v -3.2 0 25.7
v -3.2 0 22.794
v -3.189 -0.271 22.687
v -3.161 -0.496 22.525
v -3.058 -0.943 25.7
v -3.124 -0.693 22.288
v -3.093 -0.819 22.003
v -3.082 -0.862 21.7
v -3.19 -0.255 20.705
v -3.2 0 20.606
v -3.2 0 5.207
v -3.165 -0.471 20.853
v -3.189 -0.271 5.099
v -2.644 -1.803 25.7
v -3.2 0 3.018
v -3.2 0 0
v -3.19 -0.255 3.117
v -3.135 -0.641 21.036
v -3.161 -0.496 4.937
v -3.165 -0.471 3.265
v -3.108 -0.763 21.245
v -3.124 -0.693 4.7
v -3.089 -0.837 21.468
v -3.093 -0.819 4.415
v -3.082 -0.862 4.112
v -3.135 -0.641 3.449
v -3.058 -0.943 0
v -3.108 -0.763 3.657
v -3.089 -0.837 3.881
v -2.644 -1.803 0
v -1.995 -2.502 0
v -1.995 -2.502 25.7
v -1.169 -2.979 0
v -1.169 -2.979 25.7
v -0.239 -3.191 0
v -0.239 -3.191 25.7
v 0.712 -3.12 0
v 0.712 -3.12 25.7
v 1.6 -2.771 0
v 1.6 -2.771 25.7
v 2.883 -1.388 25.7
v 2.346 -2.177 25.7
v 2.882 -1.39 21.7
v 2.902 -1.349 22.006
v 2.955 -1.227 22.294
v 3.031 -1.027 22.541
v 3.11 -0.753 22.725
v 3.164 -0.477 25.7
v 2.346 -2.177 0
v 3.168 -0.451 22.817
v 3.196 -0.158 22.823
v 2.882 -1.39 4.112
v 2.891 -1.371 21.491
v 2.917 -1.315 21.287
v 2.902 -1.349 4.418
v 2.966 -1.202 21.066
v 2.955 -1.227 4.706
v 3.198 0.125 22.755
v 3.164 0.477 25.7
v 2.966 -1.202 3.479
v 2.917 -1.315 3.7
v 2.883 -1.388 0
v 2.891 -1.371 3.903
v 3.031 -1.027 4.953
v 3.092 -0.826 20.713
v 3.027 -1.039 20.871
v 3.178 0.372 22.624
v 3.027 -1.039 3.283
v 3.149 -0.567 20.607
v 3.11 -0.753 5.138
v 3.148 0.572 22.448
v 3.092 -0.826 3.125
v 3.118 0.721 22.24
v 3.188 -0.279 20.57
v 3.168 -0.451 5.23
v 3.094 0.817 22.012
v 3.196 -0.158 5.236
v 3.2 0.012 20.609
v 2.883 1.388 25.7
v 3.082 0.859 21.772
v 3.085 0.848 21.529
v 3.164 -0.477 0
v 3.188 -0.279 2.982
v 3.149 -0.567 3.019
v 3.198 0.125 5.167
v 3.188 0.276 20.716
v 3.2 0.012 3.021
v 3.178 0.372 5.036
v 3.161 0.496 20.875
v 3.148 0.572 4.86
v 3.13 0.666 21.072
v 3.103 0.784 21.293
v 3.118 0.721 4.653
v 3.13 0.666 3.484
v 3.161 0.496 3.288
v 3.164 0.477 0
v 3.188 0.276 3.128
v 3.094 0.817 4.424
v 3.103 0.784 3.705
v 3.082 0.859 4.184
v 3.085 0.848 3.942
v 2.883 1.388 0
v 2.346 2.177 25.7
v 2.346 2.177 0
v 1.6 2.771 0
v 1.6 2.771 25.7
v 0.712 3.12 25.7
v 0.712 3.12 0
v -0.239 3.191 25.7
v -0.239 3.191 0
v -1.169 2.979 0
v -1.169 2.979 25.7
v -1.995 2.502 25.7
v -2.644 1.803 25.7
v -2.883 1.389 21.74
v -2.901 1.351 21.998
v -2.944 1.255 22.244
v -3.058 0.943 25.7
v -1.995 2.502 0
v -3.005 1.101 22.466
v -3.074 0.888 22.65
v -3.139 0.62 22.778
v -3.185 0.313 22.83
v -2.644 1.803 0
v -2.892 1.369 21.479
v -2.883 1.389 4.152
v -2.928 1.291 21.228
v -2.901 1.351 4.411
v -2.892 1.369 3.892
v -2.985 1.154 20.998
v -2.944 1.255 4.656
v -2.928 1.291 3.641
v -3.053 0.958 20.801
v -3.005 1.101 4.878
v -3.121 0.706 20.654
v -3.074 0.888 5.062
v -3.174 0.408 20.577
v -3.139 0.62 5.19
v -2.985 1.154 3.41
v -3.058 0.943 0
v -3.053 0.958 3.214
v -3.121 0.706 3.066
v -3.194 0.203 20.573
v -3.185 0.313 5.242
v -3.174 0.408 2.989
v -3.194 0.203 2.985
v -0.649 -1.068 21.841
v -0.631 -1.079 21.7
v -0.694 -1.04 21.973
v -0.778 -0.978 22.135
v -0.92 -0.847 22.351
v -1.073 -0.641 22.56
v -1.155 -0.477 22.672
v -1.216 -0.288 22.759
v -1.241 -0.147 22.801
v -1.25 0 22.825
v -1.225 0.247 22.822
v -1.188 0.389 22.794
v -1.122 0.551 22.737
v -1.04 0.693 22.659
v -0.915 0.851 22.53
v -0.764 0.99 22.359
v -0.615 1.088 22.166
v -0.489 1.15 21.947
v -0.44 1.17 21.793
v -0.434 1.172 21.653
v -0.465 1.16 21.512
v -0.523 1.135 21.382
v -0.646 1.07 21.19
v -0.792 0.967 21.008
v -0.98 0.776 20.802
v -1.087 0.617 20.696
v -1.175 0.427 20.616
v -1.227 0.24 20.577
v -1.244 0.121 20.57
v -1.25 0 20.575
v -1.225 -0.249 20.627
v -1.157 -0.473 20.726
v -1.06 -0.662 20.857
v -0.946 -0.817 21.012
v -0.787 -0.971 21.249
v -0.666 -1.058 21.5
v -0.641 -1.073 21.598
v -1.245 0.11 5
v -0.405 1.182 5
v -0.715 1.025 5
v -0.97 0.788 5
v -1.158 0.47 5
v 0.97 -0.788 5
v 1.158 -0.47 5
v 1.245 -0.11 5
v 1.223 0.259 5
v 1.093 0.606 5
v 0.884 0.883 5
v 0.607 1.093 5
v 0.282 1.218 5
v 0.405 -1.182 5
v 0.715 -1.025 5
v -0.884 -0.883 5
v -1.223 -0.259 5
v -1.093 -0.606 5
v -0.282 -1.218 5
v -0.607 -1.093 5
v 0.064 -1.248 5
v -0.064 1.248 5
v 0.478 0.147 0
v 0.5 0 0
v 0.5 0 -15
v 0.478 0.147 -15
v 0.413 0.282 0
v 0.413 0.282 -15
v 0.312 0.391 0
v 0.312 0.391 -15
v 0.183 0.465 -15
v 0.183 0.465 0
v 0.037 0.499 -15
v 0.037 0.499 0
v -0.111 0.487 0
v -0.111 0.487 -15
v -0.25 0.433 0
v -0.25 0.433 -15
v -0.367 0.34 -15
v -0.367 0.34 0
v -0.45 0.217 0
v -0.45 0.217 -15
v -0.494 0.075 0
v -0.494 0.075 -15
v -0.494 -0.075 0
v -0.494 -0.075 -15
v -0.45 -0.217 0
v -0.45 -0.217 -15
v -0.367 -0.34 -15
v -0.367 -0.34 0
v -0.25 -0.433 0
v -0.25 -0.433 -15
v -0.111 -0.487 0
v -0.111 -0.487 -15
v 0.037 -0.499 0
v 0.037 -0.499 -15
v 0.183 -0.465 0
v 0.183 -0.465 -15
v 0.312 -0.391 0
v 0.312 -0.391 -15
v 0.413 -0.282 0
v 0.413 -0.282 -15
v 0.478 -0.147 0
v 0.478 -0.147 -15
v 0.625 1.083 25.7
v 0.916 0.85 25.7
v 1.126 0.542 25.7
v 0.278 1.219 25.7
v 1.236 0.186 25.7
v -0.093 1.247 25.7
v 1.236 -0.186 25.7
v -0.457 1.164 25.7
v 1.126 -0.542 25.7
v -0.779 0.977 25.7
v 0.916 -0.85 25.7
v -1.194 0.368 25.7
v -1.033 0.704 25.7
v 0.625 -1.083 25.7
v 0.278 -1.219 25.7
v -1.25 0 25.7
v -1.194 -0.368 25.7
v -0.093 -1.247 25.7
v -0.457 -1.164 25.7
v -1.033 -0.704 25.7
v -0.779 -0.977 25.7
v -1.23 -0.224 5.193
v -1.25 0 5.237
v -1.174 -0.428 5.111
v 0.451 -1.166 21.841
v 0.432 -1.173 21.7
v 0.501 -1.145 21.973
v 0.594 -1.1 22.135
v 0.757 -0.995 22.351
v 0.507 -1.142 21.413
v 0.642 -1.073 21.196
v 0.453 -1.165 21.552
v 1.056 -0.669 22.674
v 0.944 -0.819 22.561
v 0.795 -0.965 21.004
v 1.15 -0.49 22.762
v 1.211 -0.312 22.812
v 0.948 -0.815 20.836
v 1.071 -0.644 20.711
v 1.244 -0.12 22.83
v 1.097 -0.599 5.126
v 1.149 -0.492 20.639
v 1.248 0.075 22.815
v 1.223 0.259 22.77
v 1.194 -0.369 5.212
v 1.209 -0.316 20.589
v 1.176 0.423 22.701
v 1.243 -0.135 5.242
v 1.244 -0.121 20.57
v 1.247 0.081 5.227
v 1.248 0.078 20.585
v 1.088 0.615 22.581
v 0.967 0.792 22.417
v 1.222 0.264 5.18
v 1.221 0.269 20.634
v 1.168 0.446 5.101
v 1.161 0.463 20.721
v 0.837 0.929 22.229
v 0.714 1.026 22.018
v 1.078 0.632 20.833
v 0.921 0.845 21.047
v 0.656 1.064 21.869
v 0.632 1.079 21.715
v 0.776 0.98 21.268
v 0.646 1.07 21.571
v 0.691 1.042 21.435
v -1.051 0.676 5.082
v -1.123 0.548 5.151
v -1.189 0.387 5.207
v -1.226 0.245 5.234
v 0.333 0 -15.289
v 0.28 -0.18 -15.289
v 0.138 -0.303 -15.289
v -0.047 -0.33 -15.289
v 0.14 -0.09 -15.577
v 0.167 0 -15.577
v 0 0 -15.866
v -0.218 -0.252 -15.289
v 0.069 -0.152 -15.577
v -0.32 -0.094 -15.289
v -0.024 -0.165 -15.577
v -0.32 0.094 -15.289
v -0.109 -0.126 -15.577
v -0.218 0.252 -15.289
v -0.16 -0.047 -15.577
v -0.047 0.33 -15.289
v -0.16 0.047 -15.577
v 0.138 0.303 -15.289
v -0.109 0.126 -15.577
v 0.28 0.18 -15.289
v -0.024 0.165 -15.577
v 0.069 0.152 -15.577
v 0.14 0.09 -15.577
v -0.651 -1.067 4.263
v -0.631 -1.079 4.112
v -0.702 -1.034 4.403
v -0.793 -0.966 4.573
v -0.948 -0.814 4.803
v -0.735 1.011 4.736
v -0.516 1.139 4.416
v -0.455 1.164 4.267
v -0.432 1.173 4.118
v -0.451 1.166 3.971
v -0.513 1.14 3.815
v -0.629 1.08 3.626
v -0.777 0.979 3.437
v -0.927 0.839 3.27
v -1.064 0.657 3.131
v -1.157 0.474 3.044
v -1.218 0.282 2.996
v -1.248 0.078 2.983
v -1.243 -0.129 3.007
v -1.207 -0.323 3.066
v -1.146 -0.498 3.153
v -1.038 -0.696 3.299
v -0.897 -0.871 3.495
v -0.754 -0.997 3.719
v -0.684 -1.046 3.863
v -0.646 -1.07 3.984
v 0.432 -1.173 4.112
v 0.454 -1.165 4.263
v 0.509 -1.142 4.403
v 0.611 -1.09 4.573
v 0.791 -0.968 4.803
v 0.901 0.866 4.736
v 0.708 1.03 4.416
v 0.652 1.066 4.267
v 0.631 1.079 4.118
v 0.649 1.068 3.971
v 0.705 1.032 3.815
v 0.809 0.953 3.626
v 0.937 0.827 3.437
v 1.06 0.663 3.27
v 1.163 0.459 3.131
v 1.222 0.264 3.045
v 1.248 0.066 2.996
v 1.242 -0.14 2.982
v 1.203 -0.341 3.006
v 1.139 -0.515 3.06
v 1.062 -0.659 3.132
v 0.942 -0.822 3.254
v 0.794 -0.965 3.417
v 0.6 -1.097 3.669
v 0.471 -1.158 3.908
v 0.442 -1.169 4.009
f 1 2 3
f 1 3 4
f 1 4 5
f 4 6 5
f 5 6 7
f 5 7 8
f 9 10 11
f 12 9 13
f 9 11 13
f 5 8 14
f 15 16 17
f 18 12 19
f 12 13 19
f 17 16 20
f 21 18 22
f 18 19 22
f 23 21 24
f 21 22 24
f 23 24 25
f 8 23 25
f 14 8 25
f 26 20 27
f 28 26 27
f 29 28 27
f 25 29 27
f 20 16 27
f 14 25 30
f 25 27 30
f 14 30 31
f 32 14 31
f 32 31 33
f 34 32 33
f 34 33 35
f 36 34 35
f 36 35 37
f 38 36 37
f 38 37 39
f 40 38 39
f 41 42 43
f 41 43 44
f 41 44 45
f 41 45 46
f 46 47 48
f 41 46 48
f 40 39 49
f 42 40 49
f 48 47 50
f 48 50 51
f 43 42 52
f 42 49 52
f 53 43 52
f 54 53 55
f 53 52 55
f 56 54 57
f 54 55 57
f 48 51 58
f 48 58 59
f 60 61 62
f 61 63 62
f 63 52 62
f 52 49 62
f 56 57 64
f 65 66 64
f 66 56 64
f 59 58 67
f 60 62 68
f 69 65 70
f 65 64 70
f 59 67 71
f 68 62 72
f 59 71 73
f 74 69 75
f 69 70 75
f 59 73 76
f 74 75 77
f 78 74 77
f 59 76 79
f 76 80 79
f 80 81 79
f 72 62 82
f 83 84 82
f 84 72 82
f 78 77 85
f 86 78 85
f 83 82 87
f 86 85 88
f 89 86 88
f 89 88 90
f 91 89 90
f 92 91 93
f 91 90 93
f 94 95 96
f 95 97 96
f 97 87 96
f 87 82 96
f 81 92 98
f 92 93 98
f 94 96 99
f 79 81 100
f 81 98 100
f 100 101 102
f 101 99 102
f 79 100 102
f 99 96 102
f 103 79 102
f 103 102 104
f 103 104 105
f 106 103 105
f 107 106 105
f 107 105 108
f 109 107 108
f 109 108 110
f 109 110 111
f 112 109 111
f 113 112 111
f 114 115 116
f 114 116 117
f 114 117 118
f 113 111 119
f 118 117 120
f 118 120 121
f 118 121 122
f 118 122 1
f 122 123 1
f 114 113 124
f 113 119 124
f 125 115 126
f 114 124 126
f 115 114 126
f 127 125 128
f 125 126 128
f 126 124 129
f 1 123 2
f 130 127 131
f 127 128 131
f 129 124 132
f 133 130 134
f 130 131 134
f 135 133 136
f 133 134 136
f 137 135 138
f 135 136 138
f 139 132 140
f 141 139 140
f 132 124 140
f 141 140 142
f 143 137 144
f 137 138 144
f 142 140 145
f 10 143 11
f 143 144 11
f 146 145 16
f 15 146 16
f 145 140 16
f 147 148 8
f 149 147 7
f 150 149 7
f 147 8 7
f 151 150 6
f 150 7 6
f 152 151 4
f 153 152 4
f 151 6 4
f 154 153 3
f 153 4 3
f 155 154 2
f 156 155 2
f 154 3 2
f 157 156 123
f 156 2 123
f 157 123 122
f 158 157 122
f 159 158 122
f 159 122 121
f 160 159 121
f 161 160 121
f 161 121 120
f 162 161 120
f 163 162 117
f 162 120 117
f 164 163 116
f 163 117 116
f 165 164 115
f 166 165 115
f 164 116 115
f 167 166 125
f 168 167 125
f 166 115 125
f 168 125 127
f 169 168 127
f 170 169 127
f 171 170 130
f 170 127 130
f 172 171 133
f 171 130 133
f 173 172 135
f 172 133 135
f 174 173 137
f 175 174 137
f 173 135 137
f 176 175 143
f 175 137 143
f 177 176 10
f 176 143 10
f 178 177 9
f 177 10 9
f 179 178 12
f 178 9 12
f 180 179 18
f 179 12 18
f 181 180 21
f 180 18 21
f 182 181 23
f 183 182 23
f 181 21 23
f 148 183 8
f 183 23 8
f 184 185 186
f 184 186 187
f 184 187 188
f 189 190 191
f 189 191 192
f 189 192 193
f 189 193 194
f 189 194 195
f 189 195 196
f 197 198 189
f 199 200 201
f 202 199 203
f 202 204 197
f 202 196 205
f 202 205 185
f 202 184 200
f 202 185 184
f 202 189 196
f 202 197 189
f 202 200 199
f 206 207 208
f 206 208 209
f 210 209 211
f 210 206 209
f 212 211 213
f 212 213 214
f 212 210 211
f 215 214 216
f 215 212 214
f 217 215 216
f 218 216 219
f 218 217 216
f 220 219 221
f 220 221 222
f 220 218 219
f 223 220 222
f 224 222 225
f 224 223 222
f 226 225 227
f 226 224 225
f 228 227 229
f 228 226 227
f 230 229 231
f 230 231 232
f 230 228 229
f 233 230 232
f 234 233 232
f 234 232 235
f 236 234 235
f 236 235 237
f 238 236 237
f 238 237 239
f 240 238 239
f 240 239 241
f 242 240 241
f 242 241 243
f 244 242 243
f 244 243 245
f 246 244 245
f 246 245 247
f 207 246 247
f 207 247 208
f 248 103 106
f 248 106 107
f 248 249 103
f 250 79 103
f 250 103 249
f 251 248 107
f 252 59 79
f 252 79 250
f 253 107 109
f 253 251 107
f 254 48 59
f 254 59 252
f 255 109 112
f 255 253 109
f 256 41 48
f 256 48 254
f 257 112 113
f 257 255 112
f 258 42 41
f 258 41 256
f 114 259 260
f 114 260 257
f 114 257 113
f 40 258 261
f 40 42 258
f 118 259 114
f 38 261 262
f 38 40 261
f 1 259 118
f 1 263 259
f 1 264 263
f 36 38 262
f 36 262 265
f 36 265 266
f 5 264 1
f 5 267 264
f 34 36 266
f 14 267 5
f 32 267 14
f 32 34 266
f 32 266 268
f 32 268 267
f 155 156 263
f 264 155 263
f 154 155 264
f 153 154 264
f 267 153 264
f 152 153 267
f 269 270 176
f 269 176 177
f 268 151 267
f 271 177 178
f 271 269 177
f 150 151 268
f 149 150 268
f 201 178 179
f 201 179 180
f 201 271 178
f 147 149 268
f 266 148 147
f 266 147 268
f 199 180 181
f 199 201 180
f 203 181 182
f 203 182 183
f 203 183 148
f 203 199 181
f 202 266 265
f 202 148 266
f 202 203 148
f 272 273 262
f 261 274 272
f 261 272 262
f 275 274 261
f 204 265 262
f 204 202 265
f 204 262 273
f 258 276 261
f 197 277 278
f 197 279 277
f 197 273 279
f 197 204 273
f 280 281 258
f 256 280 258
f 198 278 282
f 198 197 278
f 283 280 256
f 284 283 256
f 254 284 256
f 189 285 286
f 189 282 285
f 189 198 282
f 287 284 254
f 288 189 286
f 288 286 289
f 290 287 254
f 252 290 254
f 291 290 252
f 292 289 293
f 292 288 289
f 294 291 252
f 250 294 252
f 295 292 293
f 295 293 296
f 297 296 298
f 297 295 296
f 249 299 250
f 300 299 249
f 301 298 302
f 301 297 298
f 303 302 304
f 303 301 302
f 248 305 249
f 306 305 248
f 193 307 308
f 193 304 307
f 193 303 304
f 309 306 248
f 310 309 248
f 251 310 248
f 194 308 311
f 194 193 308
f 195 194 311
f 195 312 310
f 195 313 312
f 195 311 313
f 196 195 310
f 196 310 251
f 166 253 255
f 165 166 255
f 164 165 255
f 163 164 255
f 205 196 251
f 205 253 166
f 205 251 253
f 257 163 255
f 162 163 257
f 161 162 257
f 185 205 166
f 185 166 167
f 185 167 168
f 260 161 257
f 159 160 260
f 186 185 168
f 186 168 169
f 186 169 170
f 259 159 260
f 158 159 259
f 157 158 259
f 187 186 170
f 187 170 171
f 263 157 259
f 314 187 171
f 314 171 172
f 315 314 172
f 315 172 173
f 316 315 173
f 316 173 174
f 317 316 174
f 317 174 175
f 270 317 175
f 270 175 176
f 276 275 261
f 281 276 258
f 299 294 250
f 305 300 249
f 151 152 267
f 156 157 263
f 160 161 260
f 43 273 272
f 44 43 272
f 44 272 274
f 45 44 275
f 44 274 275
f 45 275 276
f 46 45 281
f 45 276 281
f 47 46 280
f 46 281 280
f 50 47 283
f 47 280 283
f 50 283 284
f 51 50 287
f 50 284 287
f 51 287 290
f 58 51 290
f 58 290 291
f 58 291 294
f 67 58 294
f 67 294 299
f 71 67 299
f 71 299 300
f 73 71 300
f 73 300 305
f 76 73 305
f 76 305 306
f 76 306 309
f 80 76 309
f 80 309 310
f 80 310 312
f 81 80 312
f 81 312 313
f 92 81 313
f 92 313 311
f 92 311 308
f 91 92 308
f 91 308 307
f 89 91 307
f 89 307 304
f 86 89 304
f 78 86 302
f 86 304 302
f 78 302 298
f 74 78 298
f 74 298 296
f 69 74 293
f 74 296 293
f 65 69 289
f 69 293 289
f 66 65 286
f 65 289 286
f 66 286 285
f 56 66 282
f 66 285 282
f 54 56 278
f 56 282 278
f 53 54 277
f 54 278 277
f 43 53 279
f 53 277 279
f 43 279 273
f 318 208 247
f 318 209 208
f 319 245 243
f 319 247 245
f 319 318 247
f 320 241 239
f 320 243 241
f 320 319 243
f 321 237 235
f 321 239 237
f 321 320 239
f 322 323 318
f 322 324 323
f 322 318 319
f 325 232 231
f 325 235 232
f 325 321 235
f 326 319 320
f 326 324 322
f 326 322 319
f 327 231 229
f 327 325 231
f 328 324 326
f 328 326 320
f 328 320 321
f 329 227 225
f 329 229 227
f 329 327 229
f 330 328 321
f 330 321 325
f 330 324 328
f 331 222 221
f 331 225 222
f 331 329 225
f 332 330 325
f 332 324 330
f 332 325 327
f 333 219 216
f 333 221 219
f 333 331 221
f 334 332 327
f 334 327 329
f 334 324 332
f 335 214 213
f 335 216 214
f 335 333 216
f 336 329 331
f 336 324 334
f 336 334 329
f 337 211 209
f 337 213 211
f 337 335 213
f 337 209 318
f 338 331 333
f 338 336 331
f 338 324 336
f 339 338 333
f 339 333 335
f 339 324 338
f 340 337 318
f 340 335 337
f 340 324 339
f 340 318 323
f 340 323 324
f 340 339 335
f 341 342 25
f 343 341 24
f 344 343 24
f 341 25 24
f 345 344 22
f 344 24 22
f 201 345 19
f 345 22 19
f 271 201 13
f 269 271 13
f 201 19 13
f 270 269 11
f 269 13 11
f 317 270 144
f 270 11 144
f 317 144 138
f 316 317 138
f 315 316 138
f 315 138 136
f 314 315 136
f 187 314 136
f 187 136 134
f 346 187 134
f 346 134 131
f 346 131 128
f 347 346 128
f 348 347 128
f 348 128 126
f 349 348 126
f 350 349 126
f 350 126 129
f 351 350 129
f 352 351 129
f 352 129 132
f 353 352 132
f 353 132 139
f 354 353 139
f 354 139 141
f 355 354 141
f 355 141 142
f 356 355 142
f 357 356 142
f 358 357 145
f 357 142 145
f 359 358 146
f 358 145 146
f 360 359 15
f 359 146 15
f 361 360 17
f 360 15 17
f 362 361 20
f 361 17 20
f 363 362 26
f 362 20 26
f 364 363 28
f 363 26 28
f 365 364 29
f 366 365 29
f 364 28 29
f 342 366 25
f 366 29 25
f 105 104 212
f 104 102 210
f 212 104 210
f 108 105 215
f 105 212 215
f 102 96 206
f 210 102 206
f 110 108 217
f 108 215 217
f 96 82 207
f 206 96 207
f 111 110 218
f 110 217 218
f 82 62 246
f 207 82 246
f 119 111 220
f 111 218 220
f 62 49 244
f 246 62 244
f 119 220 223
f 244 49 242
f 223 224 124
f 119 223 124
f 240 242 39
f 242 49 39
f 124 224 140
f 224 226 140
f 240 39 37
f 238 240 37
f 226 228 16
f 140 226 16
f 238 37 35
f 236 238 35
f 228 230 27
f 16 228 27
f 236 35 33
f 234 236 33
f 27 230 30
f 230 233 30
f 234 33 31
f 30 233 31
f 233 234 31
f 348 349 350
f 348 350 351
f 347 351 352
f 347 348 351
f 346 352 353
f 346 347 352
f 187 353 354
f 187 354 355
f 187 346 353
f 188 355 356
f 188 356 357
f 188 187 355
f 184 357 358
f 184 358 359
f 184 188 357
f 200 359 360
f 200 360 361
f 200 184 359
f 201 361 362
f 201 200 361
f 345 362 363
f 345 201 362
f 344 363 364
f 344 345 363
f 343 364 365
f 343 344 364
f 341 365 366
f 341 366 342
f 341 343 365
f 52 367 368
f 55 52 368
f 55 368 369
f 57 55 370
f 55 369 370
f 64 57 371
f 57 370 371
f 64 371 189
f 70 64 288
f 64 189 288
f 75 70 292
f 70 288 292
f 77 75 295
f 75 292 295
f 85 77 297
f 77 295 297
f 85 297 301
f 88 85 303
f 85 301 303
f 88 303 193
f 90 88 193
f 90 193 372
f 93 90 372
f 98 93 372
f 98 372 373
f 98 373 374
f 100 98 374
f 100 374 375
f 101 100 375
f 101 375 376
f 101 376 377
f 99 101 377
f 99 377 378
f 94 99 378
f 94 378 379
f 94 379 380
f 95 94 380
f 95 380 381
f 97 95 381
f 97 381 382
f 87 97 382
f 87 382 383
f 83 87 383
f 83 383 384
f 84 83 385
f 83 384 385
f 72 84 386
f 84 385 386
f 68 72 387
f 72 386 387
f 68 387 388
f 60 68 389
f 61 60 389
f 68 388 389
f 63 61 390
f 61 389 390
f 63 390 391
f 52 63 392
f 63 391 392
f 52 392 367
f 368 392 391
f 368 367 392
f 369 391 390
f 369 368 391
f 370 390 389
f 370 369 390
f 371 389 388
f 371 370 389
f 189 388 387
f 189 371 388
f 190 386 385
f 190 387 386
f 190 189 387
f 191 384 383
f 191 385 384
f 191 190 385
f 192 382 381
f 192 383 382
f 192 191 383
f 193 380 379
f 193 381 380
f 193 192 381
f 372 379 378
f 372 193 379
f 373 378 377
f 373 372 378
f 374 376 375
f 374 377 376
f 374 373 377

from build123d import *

# Parameters (mm, degrees)
SKETCH3_R                           = 3.2
SKETCH3_R_2                         = 0.5
BOSS_EXTRUDE2_DEPTH                 = 25.7
CUT_EXTRUDE1_DEPTH                  = 27.095401894
CUT_EXTRUDE1_DEPTH_BACK             = 25.7
SKETCH6_R                           = 1.25
TAP_DRILL_FOR_4_40_TAP1_D           = 2.2606
TAP_DRILL_FOR_4_40_TAP1_ON_FACE_2_D = 2.2606
BOSS_EXTRUDE4_START                 = 5
SKETCH3_4_R                         = 0.5
BOSS_EXTRUDE4_DEPTH                 = 20
BOSS_EXTRUDE5_START                 = -20.7
SKETCH6_2_R                         = 1.25
SKETCH6_2_R_2                       = 0.5
BOSS_EXTRUDE5_DEPTH                 = 5


with BuildPart() as part:
    # Sketch3 → Boss-Extrude2 (new body)
    with BuildSketch(Plane.XY):
        with Locations(Location((0, 0, 0), (0, 0, 180))):
            Circle(SKETCH3_R)
        Circle(SKETCH3_R_2, mode=Mode.SUBTRACT)
    extrude(amount=BOSS_EXTRUDE2_DEPTH)

    # Sketch6 → Cut-Extrude1 (cut, two sides: drawn at the far end of the back side and taken through both)
    with BuildSketch(Plane.XY.offset(25.7).offset(-CUT_EXTRUDE1_DEPTH_BACK)):
        with Locations(Location((0, 0, 0), (0, 0, 180))):
            Circle(SKETCH6_R)
    extrude(amount=CUT_EXTRUDE1_DEPTH + CUT_EXTRUDE1_DEPTH_BACK, mode=Mode.SUBTRACT)

    # Tap Drill for #4-40 Tap1 (through all)
    with Locations(Plane(origin=(3.187528357, -0.282246299, 21.7), x_dir=(0.088201968553, 0.996102611553, 0), z_dir=(0.996102611553, -0.088201968553, 0))):
        with Locations((0, 0)):
            Hole(TAP_DRILL_FOR_4_40_TAP1_D / 2)

    # Tap Drill for #4-40 Tap1 on face 2 (through all)
    with Locations(Plane(origin=(3.187528357, -0.282246299, 4.112360987), x_dir=(0.088201965627, 0.996102611812, 0), z_dir=(0.996102611812, -0.088201965627, 0))):
        with Locations((0, 0)):
            Hole(TAP_DRILL_FOR_4_40_TAP1_ON_FACE_2_D / 2)



with BuildPart() as body_2:
    # Sketch3<4> → Boss-Extrude4 (new body)
    with BuildSketch(Plane.XY.offset(BOSS_EXTRUDE4_START)):
        Circle(SKETCH3_4_R)
    extrude(amount=-BOSS_EXTRUDE4_DEPTH)

    # Sketch9 → Revolve1 (revolve)
    with BuildSketch(Plane(origin=(0, 0, 0), x_dir=(1, 0, 0), z_dir=(0, 1, 0)), mode=Mode.PRIVATE) as revolve1_sk:
        Polygon((0, 15), (-0.5, 15), (0, 15.866025404), align=None)
    revolve(revolve1_sk.sketch.rotate(Axis((0, 0, -15), (0, 0, -1)), 180), axis=Axis((0, 0, -15), (0, 0, -1)))


with BuildPart() as part_1:
    add(part.part)

    add(body_2.part)  # Boss-Extrude5 merges body 2
    # Sketch6<2> → Boss-Extrude5 (add)
    with BuildSketch(Plane.XY.offset(25.7).offset(BOSS_EXTRUDE5_START)):
        with Locations(Location((0, 0, 0), (0, 0, 208.982799993))):
            Circle(SKETCH6_2_R)
        Circle(SKETCH6_2_R_2, mode=Mode.SUBTRACT)
    extrude(amount=-BOSS_EXTRUDE5_DEPTH)


solid = part_1.part
